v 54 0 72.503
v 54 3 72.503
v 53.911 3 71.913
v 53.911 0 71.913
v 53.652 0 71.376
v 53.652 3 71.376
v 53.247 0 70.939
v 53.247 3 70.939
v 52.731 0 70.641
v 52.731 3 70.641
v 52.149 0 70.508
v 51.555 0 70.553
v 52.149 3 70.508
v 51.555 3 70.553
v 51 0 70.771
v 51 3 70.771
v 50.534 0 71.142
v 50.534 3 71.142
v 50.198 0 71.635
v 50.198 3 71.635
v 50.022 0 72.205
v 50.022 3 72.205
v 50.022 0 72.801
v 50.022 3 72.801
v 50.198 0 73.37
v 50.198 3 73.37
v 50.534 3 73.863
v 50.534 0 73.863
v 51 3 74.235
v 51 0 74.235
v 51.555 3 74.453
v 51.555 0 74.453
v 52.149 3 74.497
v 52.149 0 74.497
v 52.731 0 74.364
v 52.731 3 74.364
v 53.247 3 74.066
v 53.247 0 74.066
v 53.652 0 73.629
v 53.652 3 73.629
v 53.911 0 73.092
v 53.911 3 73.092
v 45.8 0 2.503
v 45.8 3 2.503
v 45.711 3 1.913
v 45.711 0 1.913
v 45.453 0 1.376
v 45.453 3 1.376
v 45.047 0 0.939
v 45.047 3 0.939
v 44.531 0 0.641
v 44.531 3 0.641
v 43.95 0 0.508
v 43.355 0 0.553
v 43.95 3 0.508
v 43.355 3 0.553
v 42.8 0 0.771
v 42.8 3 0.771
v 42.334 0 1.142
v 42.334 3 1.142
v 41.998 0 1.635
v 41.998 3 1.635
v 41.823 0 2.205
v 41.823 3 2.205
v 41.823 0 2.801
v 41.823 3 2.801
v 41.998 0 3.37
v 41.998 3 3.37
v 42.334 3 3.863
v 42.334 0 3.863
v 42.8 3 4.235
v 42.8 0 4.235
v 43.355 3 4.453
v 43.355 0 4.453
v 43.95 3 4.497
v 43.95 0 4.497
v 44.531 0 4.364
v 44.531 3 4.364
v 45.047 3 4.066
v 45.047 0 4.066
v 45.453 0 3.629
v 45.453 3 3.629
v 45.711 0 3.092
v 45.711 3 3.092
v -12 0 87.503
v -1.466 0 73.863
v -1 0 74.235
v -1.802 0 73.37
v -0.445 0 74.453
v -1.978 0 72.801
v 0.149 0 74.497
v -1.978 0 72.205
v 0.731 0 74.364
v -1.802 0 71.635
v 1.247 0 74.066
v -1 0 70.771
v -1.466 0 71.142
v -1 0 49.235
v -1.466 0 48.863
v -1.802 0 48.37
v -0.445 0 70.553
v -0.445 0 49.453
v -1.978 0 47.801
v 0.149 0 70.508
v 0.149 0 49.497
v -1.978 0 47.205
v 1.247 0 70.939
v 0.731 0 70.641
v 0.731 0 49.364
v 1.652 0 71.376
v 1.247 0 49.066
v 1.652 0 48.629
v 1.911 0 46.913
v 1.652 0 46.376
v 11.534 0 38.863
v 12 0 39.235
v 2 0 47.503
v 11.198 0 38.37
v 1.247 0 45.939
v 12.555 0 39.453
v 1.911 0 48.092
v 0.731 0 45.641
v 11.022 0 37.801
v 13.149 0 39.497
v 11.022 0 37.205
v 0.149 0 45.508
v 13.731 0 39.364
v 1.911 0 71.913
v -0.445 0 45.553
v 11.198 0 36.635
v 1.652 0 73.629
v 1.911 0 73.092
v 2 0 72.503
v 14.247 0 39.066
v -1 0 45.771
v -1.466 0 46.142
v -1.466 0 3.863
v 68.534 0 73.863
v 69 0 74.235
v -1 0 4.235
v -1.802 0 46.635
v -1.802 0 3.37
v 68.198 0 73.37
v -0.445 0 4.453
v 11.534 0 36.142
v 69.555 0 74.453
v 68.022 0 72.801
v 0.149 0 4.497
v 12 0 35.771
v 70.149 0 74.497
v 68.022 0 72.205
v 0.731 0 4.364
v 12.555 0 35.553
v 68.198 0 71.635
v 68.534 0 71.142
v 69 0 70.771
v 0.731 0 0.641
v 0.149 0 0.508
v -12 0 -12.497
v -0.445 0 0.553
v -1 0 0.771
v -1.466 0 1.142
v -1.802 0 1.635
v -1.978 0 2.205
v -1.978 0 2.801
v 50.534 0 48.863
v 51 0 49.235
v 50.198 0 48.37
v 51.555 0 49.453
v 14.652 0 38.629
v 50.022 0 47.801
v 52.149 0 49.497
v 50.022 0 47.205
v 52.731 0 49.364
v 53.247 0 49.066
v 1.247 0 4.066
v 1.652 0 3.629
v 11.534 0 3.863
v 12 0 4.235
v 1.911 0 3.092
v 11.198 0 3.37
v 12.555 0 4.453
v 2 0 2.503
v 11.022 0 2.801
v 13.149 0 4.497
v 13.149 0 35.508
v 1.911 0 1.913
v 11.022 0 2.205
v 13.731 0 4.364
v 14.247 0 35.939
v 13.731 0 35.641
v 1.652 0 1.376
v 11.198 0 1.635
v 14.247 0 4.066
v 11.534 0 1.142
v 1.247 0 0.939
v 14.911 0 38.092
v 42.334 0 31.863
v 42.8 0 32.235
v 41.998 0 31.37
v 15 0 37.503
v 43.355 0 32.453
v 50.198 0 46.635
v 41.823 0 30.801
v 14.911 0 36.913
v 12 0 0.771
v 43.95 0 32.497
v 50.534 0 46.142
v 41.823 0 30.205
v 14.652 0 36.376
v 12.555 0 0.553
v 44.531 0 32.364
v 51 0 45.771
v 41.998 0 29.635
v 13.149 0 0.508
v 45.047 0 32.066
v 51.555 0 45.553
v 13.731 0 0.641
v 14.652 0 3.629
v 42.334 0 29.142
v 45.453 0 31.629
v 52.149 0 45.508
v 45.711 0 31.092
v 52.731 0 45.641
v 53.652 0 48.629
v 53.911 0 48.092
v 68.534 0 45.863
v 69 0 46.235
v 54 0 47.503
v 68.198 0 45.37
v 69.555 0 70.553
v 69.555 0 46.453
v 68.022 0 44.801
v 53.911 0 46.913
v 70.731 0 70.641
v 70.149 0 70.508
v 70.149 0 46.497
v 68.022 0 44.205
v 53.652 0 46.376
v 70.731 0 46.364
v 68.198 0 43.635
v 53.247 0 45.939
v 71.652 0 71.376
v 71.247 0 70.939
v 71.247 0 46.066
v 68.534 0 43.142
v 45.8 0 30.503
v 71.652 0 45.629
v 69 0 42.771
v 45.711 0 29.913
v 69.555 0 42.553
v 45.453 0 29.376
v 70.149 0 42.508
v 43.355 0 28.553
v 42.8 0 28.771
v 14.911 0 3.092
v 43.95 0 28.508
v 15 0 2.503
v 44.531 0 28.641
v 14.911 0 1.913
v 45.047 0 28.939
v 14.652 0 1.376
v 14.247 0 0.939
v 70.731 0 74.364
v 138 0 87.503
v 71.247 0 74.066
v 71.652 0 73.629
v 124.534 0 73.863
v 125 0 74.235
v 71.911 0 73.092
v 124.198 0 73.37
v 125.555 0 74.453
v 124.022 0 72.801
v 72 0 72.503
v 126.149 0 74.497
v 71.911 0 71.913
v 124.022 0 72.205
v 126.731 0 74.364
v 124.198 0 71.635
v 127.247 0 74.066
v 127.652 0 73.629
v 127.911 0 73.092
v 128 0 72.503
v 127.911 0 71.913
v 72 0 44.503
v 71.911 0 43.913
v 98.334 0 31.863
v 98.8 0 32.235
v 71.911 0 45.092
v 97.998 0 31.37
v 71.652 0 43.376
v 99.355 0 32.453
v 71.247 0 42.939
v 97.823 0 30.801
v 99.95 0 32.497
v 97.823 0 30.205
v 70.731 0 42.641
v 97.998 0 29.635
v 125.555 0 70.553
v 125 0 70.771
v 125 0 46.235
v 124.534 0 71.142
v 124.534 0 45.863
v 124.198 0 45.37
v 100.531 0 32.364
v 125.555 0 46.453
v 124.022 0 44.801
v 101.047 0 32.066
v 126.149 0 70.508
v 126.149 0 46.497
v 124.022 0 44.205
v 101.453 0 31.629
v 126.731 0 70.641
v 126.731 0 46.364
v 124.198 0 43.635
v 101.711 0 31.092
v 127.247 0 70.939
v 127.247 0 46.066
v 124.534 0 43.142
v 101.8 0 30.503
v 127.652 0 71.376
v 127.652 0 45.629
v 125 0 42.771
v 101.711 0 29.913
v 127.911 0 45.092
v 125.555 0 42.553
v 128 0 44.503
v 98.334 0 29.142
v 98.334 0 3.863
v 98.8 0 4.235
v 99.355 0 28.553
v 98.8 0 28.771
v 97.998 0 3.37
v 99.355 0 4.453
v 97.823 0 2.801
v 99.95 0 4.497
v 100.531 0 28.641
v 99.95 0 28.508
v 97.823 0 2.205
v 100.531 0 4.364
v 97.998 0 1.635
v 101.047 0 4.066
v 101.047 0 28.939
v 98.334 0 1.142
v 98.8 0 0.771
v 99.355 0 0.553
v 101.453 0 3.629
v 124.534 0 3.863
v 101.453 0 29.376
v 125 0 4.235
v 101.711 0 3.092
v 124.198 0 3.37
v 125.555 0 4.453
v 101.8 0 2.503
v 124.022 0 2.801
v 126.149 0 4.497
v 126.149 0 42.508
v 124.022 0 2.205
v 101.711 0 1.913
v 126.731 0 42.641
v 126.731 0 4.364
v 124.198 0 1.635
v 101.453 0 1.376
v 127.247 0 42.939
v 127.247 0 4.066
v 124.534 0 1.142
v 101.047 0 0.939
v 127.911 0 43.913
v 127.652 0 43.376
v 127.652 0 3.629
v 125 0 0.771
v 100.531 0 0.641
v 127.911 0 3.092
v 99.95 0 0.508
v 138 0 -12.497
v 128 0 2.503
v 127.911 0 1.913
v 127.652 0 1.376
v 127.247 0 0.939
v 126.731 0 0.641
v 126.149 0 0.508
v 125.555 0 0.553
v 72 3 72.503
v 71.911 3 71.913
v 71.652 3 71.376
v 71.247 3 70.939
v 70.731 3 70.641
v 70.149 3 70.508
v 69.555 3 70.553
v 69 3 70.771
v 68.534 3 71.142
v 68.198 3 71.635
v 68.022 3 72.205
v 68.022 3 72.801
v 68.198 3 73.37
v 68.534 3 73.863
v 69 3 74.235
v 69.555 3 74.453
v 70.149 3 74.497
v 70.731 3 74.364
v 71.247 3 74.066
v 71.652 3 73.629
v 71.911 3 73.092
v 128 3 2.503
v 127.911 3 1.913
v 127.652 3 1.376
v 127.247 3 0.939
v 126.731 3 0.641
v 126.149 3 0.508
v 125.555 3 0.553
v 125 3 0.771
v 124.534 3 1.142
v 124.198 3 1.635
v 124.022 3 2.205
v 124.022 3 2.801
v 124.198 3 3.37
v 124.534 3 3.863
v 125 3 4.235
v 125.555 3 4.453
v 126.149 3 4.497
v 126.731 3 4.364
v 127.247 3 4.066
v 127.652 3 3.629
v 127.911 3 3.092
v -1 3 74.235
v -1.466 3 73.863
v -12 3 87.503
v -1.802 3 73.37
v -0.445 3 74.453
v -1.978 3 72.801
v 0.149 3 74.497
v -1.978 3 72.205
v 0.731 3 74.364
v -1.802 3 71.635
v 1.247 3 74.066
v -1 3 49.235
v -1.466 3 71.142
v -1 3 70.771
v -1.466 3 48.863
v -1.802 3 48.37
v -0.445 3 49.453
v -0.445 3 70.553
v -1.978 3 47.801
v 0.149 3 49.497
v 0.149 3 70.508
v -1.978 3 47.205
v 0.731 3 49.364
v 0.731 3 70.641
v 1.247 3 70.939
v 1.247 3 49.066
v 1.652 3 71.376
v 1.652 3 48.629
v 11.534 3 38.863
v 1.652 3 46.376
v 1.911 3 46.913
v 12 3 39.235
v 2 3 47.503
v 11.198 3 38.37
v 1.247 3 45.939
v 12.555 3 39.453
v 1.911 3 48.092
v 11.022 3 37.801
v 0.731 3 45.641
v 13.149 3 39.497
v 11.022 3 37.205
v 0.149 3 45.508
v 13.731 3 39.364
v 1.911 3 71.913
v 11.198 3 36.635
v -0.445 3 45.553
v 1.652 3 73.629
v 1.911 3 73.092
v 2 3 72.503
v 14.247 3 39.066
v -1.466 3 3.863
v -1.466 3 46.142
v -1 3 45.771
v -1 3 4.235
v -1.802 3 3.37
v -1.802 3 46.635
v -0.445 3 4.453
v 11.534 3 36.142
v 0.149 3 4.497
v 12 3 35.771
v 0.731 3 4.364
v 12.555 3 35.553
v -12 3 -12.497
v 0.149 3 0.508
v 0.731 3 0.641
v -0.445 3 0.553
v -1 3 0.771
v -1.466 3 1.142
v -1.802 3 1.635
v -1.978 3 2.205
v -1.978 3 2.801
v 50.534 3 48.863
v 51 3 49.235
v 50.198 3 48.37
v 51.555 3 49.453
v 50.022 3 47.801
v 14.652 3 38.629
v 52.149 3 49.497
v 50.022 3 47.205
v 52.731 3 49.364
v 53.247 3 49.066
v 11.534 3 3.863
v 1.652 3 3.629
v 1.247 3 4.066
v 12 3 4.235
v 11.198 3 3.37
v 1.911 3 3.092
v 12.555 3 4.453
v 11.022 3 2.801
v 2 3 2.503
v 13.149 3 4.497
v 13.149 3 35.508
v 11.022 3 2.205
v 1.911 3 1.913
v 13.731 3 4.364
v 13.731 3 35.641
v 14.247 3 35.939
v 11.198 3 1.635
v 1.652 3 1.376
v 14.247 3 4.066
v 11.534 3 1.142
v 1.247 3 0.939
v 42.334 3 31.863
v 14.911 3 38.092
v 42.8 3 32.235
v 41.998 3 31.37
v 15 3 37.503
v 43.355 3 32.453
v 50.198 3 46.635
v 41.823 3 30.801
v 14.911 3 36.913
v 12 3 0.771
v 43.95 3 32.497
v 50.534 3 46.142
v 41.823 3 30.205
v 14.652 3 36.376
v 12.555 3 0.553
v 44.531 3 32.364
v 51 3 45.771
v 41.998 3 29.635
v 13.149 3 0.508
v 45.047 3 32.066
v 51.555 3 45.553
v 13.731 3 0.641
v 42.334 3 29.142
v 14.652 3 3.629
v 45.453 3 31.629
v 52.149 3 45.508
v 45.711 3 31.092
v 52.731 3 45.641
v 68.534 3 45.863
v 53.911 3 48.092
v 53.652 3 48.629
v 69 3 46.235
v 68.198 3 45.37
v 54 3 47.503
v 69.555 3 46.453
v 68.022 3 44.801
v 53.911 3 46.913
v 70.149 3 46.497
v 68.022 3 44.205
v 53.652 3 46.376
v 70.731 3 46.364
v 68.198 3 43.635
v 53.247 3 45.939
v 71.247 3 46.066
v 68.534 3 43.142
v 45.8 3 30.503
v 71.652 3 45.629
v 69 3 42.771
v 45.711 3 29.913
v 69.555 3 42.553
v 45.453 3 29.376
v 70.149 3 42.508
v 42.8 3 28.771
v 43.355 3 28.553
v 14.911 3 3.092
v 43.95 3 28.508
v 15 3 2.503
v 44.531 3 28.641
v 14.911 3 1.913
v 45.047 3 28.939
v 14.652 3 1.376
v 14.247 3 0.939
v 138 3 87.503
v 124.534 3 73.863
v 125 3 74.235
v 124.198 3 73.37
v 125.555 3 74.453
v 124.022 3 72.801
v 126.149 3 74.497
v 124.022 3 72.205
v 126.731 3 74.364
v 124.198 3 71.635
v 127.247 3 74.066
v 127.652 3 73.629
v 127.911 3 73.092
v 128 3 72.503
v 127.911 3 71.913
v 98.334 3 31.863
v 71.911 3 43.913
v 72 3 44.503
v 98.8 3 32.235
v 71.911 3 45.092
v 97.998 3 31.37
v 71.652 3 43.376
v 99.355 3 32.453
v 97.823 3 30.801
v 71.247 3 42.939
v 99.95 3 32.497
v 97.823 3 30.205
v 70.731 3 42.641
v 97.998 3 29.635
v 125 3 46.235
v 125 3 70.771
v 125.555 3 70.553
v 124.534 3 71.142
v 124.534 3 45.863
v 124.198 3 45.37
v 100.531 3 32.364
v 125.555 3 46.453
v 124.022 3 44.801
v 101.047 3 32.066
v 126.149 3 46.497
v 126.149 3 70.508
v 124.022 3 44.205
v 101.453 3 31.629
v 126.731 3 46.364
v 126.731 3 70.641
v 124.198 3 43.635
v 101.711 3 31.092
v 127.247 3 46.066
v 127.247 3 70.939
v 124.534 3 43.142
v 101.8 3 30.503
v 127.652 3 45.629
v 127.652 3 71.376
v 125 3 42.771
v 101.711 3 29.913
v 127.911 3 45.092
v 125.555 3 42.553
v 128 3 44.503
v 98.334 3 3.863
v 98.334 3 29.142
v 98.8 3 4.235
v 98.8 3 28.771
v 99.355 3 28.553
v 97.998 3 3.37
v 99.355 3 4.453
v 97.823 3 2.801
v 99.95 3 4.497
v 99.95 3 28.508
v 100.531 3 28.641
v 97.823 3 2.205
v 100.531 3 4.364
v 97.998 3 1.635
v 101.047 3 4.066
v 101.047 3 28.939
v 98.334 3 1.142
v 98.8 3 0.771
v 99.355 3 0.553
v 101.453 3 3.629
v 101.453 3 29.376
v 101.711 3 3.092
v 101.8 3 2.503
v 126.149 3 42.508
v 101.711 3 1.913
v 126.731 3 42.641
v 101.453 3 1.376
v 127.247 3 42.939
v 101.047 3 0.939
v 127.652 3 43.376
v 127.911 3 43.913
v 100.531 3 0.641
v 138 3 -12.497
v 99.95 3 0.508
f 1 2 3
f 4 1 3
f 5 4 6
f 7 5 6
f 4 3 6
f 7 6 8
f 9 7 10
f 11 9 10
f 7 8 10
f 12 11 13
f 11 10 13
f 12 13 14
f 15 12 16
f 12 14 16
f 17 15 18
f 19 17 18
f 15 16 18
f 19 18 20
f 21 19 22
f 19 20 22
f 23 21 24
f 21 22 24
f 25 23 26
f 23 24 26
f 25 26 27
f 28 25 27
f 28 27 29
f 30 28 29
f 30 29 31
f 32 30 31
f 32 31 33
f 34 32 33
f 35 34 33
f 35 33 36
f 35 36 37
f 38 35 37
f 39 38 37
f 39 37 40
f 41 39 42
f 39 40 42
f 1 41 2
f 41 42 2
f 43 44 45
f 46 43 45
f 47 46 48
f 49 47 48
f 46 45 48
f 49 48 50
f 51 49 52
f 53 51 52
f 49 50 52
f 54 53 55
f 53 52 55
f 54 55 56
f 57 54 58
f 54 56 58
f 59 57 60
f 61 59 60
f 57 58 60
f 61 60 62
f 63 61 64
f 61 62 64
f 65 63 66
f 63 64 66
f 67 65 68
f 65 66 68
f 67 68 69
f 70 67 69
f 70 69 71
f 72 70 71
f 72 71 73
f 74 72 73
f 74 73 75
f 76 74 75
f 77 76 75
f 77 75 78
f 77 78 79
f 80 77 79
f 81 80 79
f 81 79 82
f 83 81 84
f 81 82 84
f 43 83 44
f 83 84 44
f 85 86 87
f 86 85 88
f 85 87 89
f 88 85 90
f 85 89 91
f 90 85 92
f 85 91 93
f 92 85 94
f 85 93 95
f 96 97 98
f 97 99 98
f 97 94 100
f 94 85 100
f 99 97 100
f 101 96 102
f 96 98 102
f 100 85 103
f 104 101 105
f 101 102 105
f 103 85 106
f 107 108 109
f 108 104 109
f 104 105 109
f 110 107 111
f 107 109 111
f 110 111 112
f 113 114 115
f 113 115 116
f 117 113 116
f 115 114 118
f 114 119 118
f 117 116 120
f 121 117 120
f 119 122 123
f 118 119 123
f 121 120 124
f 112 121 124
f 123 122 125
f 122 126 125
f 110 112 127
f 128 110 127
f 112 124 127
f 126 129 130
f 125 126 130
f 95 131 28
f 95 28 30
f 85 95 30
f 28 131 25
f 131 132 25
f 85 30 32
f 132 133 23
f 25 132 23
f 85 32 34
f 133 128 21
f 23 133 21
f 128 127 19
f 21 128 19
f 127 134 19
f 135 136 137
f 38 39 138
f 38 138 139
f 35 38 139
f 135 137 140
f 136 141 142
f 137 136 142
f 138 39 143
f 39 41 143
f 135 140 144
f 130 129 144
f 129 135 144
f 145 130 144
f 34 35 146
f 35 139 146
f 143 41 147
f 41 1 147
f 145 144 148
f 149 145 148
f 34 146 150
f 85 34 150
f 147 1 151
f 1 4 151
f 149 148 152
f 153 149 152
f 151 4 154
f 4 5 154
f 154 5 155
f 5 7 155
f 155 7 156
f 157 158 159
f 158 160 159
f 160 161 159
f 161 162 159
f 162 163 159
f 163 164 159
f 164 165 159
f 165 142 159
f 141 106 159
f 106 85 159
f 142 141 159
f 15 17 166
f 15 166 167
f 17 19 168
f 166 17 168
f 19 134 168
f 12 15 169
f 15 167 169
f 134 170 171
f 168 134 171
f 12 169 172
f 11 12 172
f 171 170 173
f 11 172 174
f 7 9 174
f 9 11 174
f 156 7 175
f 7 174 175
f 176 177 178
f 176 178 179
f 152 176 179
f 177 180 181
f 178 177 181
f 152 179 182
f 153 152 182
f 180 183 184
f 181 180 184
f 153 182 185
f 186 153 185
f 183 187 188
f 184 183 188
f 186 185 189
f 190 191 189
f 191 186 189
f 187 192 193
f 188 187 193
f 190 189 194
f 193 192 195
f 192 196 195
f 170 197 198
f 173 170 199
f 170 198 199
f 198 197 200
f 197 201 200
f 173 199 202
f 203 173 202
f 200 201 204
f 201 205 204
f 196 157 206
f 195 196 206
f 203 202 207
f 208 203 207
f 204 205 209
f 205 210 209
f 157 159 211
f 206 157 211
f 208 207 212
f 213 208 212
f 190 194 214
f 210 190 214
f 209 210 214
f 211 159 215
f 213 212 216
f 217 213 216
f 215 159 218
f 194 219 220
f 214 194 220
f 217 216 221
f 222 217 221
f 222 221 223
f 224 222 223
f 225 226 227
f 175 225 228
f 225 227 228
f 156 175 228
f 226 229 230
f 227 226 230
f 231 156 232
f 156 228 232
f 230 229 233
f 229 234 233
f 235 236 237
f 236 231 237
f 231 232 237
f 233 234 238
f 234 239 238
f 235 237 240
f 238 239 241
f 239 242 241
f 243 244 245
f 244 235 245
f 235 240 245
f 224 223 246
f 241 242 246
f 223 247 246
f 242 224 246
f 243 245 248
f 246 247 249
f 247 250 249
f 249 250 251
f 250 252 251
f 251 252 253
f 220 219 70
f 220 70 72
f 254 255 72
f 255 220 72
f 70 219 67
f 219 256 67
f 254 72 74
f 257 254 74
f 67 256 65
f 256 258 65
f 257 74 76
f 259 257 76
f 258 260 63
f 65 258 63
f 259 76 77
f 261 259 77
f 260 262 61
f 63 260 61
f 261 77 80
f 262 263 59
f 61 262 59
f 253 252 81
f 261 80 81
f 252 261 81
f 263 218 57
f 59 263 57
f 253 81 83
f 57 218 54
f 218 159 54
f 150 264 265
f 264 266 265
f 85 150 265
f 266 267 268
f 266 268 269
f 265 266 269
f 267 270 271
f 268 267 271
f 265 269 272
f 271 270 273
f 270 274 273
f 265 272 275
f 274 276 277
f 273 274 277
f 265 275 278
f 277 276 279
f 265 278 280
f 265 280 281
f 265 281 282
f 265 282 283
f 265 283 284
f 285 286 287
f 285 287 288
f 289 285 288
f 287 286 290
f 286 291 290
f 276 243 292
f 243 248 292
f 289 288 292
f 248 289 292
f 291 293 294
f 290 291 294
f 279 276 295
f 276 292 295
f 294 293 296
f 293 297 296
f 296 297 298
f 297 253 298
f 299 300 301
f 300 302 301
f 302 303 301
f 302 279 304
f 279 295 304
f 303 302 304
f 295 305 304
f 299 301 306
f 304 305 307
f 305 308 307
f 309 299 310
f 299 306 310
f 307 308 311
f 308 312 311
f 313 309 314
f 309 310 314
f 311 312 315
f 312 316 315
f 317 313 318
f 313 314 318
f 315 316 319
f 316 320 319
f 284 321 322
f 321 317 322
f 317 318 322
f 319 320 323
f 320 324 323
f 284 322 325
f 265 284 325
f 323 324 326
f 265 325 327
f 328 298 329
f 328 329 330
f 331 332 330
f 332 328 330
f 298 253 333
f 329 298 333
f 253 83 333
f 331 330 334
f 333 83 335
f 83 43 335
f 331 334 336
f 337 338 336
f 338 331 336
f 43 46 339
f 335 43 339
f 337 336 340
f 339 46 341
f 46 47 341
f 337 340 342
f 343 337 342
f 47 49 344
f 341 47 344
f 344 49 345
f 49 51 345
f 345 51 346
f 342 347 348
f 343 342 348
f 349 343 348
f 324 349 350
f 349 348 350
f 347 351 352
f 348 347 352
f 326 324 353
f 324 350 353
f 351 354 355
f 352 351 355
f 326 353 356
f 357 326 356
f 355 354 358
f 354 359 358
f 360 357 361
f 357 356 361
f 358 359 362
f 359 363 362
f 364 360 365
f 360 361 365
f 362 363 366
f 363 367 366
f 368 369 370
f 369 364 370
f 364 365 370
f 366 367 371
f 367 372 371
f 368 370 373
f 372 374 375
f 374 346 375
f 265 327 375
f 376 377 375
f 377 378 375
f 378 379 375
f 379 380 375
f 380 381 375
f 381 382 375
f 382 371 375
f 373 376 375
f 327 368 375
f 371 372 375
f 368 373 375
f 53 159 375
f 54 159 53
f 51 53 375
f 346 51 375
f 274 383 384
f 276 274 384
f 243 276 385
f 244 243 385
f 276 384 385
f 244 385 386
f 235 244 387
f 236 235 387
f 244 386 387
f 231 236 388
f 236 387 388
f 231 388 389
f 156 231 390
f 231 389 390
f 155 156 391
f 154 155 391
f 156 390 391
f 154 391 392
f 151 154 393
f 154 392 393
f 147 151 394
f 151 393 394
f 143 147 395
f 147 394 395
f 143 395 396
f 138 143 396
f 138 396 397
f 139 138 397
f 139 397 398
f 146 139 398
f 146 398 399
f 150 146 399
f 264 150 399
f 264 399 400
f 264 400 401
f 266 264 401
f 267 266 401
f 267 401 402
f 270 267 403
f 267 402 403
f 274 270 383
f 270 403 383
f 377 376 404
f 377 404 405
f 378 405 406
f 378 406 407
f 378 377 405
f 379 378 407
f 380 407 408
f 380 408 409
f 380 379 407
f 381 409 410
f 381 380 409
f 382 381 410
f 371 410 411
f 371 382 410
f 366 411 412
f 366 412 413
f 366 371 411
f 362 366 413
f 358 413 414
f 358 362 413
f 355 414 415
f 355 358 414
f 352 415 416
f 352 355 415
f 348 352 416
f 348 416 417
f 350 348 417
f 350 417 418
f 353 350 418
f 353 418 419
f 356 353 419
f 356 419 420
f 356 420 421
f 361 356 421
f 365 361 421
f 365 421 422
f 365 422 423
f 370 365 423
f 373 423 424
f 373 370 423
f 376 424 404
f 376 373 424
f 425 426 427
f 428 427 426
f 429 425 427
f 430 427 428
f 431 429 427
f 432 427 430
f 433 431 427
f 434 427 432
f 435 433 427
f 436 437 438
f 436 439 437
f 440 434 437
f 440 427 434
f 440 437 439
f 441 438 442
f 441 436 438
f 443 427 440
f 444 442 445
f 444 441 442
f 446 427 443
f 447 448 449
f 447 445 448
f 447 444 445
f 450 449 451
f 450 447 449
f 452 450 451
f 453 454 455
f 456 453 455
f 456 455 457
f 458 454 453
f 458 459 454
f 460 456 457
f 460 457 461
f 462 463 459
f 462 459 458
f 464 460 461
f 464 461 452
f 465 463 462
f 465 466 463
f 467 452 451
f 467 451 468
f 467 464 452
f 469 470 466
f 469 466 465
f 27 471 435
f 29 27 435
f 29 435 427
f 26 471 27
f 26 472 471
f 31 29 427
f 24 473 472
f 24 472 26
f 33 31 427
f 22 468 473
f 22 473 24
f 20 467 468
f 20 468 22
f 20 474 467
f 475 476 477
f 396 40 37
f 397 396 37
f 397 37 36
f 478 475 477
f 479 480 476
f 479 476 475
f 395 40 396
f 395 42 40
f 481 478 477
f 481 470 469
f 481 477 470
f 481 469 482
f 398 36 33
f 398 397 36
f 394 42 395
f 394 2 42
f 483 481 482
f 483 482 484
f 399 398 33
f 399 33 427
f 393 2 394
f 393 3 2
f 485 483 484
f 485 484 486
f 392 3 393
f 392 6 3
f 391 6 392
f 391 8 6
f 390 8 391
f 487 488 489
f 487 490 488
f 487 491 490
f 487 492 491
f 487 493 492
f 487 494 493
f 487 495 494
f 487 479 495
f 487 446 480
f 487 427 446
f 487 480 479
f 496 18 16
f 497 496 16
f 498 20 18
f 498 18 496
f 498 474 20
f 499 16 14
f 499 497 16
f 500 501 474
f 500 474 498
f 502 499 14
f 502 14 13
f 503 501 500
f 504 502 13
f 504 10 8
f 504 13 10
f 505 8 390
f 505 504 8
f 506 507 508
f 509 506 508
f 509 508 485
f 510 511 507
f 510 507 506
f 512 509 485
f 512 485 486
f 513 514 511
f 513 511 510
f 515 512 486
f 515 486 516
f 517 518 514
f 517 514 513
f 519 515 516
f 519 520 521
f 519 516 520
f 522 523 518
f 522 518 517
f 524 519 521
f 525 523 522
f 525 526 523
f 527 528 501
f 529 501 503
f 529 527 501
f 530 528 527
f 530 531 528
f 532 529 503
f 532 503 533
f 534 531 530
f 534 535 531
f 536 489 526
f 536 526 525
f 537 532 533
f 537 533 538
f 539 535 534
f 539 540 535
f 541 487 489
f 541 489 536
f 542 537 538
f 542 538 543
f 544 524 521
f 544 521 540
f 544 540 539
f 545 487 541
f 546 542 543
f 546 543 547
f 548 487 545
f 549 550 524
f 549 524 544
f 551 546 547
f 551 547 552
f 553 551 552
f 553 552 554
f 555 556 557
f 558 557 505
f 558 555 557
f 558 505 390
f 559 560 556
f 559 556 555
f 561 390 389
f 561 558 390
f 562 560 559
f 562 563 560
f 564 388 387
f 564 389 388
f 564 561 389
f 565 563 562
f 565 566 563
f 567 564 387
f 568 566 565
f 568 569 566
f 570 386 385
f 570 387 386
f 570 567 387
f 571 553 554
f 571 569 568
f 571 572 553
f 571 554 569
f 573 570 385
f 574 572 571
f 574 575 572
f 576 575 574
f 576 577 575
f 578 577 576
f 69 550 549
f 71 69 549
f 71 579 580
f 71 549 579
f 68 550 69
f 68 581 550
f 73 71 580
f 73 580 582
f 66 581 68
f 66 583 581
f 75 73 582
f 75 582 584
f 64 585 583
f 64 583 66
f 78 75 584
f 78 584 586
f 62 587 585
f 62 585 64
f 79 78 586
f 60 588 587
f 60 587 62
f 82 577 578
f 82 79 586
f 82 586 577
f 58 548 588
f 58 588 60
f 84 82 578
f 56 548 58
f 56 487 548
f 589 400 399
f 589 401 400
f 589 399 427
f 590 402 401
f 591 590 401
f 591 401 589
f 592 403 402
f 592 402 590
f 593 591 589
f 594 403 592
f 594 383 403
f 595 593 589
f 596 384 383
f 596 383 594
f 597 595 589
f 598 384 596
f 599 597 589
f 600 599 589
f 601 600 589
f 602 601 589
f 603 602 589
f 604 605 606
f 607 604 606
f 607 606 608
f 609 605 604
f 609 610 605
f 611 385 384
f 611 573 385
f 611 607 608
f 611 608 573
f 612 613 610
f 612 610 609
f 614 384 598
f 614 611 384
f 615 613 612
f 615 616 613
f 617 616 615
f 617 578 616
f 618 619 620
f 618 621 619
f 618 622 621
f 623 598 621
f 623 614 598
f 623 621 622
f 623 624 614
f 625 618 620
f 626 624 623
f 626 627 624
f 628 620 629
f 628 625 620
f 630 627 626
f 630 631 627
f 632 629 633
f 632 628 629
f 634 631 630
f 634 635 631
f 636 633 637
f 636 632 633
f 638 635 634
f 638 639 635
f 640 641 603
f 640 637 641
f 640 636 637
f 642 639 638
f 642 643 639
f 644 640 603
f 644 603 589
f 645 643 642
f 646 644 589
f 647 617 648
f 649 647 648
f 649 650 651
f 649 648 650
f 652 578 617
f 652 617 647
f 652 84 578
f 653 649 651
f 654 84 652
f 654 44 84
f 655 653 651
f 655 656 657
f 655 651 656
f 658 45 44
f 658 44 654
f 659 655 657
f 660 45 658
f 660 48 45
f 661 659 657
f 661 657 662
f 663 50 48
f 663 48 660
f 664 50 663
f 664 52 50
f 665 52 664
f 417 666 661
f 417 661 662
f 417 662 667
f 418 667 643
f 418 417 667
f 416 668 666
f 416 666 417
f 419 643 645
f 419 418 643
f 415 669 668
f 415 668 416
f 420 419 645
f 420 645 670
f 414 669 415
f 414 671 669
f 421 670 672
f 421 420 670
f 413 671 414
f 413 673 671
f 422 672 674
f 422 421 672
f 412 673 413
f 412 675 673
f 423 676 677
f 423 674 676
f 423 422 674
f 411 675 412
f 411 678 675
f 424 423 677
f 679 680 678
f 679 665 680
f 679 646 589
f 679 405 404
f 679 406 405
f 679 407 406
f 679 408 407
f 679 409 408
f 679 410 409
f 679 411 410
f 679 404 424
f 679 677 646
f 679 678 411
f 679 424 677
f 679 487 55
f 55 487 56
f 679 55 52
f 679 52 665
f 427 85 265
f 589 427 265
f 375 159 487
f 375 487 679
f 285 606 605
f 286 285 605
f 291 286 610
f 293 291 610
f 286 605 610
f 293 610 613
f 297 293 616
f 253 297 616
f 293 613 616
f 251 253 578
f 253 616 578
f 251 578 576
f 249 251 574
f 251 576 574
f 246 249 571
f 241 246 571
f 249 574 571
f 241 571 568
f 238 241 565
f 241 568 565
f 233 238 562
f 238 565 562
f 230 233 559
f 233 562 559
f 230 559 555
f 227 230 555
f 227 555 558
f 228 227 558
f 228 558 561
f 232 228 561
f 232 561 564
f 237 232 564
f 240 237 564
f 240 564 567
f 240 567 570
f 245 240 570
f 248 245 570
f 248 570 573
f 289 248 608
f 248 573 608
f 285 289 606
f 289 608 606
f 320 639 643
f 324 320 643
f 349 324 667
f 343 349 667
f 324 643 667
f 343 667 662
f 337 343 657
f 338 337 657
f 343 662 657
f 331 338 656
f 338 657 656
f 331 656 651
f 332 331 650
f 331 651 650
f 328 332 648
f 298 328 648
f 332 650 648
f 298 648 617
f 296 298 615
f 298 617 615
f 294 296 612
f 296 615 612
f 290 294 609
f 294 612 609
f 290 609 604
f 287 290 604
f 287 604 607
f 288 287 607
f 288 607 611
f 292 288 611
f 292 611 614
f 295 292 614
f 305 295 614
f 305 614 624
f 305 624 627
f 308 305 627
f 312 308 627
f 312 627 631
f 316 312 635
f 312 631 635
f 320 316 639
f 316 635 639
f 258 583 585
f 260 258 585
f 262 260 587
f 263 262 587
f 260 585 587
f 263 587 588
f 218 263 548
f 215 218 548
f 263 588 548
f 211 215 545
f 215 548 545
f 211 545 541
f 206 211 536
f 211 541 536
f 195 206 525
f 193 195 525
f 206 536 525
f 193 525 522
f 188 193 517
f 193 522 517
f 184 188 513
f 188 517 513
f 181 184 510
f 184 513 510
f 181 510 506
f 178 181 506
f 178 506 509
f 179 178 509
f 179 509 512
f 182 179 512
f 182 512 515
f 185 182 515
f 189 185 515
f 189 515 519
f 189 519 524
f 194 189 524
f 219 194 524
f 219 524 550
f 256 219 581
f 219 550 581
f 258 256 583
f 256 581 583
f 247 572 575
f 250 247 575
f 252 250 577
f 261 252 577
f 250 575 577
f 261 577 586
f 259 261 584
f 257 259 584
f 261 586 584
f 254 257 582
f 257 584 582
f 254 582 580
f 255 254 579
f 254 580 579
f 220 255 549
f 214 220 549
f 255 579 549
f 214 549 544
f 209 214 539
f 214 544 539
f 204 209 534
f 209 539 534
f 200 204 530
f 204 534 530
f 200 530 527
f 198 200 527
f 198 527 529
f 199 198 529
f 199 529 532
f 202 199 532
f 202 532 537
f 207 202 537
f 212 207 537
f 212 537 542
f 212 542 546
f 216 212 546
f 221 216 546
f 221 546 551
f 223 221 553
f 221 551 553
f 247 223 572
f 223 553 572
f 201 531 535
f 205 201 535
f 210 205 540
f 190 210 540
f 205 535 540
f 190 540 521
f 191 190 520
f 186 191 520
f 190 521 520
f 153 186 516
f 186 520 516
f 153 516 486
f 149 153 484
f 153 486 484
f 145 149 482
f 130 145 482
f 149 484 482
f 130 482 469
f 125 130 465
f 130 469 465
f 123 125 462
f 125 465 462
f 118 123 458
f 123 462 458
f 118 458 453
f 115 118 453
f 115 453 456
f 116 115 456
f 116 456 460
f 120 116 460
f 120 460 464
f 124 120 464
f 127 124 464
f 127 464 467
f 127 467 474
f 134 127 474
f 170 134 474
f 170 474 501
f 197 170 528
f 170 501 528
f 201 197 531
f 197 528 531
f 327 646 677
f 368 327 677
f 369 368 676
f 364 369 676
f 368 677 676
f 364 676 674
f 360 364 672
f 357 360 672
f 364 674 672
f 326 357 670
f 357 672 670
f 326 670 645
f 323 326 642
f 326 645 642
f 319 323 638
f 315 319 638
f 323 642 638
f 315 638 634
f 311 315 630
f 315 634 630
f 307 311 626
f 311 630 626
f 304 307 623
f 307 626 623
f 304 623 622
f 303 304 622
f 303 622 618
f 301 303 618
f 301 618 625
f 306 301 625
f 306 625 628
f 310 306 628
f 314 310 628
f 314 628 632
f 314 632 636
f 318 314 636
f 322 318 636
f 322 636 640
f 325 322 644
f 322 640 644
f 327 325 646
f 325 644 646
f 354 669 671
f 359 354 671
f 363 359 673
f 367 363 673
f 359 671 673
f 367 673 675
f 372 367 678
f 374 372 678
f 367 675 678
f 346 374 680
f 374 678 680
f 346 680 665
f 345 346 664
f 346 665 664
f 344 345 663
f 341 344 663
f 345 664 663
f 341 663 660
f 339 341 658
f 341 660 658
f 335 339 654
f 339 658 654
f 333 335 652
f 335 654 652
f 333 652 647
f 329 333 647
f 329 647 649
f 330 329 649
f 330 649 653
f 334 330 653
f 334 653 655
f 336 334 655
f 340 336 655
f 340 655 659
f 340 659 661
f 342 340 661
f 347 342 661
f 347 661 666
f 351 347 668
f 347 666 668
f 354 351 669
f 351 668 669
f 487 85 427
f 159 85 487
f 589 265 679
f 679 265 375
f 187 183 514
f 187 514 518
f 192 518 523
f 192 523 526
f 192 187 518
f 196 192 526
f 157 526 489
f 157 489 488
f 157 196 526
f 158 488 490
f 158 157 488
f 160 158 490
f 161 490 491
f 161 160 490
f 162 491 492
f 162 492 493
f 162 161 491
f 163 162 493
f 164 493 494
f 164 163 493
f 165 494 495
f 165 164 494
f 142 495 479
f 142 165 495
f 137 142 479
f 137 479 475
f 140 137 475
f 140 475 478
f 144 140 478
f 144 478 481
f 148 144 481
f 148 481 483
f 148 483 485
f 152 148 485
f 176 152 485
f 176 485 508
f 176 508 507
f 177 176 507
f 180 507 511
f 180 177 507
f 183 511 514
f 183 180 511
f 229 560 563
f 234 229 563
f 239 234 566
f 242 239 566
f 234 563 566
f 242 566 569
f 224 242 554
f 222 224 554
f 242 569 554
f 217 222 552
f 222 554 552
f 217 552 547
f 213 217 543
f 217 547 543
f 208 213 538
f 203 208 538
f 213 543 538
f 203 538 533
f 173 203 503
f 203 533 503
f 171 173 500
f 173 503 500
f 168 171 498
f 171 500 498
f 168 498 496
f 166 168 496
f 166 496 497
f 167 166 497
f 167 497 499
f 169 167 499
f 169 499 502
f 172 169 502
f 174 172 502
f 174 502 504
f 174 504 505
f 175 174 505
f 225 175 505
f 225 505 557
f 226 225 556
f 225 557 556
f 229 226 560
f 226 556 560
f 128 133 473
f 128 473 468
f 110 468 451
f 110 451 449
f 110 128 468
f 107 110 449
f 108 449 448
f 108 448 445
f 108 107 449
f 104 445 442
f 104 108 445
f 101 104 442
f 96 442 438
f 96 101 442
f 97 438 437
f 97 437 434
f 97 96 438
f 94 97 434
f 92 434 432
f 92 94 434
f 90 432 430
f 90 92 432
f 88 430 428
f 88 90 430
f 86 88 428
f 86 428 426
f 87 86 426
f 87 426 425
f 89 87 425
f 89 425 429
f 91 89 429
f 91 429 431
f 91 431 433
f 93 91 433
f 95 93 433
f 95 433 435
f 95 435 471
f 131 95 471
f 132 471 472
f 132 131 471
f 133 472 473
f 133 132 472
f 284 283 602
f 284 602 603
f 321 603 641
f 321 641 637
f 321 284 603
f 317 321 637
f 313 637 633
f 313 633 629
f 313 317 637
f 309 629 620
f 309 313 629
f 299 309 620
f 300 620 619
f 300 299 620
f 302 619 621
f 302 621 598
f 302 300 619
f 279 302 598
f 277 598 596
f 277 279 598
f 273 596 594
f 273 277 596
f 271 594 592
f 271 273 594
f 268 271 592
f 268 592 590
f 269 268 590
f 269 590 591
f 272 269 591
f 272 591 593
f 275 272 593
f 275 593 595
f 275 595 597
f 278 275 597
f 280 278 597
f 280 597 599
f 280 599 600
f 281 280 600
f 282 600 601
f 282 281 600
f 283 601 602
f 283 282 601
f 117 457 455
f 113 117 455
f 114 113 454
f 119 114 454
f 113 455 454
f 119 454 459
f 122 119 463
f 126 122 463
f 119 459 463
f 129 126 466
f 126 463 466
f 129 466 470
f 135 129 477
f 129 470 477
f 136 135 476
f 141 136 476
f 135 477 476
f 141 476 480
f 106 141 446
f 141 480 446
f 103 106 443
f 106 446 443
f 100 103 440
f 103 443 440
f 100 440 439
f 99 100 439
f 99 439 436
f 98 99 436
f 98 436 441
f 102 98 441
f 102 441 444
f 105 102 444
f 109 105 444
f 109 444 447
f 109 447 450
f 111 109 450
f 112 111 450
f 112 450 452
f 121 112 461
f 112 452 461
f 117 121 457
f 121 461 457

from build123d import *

# Parameters (mm, degrees)
SKETCH1_W           = 150
SKETCH1_H           = 100
SKETCH1_R           = 2
BOSS_EXTRUDE1_DEPTH = 3
SKETCH2_R           = 2
CUT_EXTRUDE1_DEPTH  = 3


with BuildPart() as part:
    # Sketch1 → Boss-Extrude1 (new body)
    with BuildSketch(Plane(origin=(0, 0, 0), x_dir=(1, 0, 0), z_dir=(0, 1, 0))):
        with Locations((63, -37.502720101)):
            Rectangle(SKETCH1_W, SKETCH1_H)
        with Locations((0, -2.502720101)):
            Circle(SKETCH1_R, mode=Mode.SUBTRACT)
        with Locations((126, -2.502720101)):
            Circle(SKETCH1_R, mode=Mode.SUBTRACT)
        with Locations((0, -72.502720101)):
            Circle(SKETCH1_R, mode=Mode.SUBTRACT)
        with Locations((126, -72.502720101)):
            Circle(SKETCH1_R, mode=Mode.SUBTRACT)
    extrude(amount=BOSS_EXTRUDE1_DEPTH)

    # Sketch2 → Cut-Extrude1 (cut)
    with BuildSketch(Plane(origin=(0, 3, 0), x_dir=(1, 0, 0), z_dir=(0, 1, 0))):
        with Locations((13, -2.502720101)):
            Circle(SKETCH2_R)
        with Locations((13, -37.502720101)):
            Circle(SKETCH2_R)
        with Locations((0, -47.502720101)):
            Circle(SKETCH2_R)
        with Locations((0, -72.502720101)):
            Circle(SKETCH2_R)
        with Locations((52, -47.502720101)):
            Circle(SKETCH2_R)
        with Locations((52, -72.502720101)):
            Circle(SKETCH2_R)
        with Locations((43.800232524, -2.502720101)):
            Circle(SKETCH2_R)
        with Locations((43.800232524, -30.502720101)):
            Circle(SKETCH2_R)
        with Locations((99.800232524, -2.502720101)):
            Circle(SKETCH2_R)
        with Locations((99.800232524, -30.502720101)):
            Circle(SKETCH2_R)
        with Locations((70, -44.502720101)):
            Circle(SKETCH2_R)
        with Locations((70, -72.502720101)):
            Circle(SKETCH2_R)
        with Locations((126, -44.502720101)):
            Circle(SKETCH2_R)
    extrude(amount=-CUT_EXTRUDE1_DEPTH, mode=Mode.SUBTRACT)


solid = part.part
